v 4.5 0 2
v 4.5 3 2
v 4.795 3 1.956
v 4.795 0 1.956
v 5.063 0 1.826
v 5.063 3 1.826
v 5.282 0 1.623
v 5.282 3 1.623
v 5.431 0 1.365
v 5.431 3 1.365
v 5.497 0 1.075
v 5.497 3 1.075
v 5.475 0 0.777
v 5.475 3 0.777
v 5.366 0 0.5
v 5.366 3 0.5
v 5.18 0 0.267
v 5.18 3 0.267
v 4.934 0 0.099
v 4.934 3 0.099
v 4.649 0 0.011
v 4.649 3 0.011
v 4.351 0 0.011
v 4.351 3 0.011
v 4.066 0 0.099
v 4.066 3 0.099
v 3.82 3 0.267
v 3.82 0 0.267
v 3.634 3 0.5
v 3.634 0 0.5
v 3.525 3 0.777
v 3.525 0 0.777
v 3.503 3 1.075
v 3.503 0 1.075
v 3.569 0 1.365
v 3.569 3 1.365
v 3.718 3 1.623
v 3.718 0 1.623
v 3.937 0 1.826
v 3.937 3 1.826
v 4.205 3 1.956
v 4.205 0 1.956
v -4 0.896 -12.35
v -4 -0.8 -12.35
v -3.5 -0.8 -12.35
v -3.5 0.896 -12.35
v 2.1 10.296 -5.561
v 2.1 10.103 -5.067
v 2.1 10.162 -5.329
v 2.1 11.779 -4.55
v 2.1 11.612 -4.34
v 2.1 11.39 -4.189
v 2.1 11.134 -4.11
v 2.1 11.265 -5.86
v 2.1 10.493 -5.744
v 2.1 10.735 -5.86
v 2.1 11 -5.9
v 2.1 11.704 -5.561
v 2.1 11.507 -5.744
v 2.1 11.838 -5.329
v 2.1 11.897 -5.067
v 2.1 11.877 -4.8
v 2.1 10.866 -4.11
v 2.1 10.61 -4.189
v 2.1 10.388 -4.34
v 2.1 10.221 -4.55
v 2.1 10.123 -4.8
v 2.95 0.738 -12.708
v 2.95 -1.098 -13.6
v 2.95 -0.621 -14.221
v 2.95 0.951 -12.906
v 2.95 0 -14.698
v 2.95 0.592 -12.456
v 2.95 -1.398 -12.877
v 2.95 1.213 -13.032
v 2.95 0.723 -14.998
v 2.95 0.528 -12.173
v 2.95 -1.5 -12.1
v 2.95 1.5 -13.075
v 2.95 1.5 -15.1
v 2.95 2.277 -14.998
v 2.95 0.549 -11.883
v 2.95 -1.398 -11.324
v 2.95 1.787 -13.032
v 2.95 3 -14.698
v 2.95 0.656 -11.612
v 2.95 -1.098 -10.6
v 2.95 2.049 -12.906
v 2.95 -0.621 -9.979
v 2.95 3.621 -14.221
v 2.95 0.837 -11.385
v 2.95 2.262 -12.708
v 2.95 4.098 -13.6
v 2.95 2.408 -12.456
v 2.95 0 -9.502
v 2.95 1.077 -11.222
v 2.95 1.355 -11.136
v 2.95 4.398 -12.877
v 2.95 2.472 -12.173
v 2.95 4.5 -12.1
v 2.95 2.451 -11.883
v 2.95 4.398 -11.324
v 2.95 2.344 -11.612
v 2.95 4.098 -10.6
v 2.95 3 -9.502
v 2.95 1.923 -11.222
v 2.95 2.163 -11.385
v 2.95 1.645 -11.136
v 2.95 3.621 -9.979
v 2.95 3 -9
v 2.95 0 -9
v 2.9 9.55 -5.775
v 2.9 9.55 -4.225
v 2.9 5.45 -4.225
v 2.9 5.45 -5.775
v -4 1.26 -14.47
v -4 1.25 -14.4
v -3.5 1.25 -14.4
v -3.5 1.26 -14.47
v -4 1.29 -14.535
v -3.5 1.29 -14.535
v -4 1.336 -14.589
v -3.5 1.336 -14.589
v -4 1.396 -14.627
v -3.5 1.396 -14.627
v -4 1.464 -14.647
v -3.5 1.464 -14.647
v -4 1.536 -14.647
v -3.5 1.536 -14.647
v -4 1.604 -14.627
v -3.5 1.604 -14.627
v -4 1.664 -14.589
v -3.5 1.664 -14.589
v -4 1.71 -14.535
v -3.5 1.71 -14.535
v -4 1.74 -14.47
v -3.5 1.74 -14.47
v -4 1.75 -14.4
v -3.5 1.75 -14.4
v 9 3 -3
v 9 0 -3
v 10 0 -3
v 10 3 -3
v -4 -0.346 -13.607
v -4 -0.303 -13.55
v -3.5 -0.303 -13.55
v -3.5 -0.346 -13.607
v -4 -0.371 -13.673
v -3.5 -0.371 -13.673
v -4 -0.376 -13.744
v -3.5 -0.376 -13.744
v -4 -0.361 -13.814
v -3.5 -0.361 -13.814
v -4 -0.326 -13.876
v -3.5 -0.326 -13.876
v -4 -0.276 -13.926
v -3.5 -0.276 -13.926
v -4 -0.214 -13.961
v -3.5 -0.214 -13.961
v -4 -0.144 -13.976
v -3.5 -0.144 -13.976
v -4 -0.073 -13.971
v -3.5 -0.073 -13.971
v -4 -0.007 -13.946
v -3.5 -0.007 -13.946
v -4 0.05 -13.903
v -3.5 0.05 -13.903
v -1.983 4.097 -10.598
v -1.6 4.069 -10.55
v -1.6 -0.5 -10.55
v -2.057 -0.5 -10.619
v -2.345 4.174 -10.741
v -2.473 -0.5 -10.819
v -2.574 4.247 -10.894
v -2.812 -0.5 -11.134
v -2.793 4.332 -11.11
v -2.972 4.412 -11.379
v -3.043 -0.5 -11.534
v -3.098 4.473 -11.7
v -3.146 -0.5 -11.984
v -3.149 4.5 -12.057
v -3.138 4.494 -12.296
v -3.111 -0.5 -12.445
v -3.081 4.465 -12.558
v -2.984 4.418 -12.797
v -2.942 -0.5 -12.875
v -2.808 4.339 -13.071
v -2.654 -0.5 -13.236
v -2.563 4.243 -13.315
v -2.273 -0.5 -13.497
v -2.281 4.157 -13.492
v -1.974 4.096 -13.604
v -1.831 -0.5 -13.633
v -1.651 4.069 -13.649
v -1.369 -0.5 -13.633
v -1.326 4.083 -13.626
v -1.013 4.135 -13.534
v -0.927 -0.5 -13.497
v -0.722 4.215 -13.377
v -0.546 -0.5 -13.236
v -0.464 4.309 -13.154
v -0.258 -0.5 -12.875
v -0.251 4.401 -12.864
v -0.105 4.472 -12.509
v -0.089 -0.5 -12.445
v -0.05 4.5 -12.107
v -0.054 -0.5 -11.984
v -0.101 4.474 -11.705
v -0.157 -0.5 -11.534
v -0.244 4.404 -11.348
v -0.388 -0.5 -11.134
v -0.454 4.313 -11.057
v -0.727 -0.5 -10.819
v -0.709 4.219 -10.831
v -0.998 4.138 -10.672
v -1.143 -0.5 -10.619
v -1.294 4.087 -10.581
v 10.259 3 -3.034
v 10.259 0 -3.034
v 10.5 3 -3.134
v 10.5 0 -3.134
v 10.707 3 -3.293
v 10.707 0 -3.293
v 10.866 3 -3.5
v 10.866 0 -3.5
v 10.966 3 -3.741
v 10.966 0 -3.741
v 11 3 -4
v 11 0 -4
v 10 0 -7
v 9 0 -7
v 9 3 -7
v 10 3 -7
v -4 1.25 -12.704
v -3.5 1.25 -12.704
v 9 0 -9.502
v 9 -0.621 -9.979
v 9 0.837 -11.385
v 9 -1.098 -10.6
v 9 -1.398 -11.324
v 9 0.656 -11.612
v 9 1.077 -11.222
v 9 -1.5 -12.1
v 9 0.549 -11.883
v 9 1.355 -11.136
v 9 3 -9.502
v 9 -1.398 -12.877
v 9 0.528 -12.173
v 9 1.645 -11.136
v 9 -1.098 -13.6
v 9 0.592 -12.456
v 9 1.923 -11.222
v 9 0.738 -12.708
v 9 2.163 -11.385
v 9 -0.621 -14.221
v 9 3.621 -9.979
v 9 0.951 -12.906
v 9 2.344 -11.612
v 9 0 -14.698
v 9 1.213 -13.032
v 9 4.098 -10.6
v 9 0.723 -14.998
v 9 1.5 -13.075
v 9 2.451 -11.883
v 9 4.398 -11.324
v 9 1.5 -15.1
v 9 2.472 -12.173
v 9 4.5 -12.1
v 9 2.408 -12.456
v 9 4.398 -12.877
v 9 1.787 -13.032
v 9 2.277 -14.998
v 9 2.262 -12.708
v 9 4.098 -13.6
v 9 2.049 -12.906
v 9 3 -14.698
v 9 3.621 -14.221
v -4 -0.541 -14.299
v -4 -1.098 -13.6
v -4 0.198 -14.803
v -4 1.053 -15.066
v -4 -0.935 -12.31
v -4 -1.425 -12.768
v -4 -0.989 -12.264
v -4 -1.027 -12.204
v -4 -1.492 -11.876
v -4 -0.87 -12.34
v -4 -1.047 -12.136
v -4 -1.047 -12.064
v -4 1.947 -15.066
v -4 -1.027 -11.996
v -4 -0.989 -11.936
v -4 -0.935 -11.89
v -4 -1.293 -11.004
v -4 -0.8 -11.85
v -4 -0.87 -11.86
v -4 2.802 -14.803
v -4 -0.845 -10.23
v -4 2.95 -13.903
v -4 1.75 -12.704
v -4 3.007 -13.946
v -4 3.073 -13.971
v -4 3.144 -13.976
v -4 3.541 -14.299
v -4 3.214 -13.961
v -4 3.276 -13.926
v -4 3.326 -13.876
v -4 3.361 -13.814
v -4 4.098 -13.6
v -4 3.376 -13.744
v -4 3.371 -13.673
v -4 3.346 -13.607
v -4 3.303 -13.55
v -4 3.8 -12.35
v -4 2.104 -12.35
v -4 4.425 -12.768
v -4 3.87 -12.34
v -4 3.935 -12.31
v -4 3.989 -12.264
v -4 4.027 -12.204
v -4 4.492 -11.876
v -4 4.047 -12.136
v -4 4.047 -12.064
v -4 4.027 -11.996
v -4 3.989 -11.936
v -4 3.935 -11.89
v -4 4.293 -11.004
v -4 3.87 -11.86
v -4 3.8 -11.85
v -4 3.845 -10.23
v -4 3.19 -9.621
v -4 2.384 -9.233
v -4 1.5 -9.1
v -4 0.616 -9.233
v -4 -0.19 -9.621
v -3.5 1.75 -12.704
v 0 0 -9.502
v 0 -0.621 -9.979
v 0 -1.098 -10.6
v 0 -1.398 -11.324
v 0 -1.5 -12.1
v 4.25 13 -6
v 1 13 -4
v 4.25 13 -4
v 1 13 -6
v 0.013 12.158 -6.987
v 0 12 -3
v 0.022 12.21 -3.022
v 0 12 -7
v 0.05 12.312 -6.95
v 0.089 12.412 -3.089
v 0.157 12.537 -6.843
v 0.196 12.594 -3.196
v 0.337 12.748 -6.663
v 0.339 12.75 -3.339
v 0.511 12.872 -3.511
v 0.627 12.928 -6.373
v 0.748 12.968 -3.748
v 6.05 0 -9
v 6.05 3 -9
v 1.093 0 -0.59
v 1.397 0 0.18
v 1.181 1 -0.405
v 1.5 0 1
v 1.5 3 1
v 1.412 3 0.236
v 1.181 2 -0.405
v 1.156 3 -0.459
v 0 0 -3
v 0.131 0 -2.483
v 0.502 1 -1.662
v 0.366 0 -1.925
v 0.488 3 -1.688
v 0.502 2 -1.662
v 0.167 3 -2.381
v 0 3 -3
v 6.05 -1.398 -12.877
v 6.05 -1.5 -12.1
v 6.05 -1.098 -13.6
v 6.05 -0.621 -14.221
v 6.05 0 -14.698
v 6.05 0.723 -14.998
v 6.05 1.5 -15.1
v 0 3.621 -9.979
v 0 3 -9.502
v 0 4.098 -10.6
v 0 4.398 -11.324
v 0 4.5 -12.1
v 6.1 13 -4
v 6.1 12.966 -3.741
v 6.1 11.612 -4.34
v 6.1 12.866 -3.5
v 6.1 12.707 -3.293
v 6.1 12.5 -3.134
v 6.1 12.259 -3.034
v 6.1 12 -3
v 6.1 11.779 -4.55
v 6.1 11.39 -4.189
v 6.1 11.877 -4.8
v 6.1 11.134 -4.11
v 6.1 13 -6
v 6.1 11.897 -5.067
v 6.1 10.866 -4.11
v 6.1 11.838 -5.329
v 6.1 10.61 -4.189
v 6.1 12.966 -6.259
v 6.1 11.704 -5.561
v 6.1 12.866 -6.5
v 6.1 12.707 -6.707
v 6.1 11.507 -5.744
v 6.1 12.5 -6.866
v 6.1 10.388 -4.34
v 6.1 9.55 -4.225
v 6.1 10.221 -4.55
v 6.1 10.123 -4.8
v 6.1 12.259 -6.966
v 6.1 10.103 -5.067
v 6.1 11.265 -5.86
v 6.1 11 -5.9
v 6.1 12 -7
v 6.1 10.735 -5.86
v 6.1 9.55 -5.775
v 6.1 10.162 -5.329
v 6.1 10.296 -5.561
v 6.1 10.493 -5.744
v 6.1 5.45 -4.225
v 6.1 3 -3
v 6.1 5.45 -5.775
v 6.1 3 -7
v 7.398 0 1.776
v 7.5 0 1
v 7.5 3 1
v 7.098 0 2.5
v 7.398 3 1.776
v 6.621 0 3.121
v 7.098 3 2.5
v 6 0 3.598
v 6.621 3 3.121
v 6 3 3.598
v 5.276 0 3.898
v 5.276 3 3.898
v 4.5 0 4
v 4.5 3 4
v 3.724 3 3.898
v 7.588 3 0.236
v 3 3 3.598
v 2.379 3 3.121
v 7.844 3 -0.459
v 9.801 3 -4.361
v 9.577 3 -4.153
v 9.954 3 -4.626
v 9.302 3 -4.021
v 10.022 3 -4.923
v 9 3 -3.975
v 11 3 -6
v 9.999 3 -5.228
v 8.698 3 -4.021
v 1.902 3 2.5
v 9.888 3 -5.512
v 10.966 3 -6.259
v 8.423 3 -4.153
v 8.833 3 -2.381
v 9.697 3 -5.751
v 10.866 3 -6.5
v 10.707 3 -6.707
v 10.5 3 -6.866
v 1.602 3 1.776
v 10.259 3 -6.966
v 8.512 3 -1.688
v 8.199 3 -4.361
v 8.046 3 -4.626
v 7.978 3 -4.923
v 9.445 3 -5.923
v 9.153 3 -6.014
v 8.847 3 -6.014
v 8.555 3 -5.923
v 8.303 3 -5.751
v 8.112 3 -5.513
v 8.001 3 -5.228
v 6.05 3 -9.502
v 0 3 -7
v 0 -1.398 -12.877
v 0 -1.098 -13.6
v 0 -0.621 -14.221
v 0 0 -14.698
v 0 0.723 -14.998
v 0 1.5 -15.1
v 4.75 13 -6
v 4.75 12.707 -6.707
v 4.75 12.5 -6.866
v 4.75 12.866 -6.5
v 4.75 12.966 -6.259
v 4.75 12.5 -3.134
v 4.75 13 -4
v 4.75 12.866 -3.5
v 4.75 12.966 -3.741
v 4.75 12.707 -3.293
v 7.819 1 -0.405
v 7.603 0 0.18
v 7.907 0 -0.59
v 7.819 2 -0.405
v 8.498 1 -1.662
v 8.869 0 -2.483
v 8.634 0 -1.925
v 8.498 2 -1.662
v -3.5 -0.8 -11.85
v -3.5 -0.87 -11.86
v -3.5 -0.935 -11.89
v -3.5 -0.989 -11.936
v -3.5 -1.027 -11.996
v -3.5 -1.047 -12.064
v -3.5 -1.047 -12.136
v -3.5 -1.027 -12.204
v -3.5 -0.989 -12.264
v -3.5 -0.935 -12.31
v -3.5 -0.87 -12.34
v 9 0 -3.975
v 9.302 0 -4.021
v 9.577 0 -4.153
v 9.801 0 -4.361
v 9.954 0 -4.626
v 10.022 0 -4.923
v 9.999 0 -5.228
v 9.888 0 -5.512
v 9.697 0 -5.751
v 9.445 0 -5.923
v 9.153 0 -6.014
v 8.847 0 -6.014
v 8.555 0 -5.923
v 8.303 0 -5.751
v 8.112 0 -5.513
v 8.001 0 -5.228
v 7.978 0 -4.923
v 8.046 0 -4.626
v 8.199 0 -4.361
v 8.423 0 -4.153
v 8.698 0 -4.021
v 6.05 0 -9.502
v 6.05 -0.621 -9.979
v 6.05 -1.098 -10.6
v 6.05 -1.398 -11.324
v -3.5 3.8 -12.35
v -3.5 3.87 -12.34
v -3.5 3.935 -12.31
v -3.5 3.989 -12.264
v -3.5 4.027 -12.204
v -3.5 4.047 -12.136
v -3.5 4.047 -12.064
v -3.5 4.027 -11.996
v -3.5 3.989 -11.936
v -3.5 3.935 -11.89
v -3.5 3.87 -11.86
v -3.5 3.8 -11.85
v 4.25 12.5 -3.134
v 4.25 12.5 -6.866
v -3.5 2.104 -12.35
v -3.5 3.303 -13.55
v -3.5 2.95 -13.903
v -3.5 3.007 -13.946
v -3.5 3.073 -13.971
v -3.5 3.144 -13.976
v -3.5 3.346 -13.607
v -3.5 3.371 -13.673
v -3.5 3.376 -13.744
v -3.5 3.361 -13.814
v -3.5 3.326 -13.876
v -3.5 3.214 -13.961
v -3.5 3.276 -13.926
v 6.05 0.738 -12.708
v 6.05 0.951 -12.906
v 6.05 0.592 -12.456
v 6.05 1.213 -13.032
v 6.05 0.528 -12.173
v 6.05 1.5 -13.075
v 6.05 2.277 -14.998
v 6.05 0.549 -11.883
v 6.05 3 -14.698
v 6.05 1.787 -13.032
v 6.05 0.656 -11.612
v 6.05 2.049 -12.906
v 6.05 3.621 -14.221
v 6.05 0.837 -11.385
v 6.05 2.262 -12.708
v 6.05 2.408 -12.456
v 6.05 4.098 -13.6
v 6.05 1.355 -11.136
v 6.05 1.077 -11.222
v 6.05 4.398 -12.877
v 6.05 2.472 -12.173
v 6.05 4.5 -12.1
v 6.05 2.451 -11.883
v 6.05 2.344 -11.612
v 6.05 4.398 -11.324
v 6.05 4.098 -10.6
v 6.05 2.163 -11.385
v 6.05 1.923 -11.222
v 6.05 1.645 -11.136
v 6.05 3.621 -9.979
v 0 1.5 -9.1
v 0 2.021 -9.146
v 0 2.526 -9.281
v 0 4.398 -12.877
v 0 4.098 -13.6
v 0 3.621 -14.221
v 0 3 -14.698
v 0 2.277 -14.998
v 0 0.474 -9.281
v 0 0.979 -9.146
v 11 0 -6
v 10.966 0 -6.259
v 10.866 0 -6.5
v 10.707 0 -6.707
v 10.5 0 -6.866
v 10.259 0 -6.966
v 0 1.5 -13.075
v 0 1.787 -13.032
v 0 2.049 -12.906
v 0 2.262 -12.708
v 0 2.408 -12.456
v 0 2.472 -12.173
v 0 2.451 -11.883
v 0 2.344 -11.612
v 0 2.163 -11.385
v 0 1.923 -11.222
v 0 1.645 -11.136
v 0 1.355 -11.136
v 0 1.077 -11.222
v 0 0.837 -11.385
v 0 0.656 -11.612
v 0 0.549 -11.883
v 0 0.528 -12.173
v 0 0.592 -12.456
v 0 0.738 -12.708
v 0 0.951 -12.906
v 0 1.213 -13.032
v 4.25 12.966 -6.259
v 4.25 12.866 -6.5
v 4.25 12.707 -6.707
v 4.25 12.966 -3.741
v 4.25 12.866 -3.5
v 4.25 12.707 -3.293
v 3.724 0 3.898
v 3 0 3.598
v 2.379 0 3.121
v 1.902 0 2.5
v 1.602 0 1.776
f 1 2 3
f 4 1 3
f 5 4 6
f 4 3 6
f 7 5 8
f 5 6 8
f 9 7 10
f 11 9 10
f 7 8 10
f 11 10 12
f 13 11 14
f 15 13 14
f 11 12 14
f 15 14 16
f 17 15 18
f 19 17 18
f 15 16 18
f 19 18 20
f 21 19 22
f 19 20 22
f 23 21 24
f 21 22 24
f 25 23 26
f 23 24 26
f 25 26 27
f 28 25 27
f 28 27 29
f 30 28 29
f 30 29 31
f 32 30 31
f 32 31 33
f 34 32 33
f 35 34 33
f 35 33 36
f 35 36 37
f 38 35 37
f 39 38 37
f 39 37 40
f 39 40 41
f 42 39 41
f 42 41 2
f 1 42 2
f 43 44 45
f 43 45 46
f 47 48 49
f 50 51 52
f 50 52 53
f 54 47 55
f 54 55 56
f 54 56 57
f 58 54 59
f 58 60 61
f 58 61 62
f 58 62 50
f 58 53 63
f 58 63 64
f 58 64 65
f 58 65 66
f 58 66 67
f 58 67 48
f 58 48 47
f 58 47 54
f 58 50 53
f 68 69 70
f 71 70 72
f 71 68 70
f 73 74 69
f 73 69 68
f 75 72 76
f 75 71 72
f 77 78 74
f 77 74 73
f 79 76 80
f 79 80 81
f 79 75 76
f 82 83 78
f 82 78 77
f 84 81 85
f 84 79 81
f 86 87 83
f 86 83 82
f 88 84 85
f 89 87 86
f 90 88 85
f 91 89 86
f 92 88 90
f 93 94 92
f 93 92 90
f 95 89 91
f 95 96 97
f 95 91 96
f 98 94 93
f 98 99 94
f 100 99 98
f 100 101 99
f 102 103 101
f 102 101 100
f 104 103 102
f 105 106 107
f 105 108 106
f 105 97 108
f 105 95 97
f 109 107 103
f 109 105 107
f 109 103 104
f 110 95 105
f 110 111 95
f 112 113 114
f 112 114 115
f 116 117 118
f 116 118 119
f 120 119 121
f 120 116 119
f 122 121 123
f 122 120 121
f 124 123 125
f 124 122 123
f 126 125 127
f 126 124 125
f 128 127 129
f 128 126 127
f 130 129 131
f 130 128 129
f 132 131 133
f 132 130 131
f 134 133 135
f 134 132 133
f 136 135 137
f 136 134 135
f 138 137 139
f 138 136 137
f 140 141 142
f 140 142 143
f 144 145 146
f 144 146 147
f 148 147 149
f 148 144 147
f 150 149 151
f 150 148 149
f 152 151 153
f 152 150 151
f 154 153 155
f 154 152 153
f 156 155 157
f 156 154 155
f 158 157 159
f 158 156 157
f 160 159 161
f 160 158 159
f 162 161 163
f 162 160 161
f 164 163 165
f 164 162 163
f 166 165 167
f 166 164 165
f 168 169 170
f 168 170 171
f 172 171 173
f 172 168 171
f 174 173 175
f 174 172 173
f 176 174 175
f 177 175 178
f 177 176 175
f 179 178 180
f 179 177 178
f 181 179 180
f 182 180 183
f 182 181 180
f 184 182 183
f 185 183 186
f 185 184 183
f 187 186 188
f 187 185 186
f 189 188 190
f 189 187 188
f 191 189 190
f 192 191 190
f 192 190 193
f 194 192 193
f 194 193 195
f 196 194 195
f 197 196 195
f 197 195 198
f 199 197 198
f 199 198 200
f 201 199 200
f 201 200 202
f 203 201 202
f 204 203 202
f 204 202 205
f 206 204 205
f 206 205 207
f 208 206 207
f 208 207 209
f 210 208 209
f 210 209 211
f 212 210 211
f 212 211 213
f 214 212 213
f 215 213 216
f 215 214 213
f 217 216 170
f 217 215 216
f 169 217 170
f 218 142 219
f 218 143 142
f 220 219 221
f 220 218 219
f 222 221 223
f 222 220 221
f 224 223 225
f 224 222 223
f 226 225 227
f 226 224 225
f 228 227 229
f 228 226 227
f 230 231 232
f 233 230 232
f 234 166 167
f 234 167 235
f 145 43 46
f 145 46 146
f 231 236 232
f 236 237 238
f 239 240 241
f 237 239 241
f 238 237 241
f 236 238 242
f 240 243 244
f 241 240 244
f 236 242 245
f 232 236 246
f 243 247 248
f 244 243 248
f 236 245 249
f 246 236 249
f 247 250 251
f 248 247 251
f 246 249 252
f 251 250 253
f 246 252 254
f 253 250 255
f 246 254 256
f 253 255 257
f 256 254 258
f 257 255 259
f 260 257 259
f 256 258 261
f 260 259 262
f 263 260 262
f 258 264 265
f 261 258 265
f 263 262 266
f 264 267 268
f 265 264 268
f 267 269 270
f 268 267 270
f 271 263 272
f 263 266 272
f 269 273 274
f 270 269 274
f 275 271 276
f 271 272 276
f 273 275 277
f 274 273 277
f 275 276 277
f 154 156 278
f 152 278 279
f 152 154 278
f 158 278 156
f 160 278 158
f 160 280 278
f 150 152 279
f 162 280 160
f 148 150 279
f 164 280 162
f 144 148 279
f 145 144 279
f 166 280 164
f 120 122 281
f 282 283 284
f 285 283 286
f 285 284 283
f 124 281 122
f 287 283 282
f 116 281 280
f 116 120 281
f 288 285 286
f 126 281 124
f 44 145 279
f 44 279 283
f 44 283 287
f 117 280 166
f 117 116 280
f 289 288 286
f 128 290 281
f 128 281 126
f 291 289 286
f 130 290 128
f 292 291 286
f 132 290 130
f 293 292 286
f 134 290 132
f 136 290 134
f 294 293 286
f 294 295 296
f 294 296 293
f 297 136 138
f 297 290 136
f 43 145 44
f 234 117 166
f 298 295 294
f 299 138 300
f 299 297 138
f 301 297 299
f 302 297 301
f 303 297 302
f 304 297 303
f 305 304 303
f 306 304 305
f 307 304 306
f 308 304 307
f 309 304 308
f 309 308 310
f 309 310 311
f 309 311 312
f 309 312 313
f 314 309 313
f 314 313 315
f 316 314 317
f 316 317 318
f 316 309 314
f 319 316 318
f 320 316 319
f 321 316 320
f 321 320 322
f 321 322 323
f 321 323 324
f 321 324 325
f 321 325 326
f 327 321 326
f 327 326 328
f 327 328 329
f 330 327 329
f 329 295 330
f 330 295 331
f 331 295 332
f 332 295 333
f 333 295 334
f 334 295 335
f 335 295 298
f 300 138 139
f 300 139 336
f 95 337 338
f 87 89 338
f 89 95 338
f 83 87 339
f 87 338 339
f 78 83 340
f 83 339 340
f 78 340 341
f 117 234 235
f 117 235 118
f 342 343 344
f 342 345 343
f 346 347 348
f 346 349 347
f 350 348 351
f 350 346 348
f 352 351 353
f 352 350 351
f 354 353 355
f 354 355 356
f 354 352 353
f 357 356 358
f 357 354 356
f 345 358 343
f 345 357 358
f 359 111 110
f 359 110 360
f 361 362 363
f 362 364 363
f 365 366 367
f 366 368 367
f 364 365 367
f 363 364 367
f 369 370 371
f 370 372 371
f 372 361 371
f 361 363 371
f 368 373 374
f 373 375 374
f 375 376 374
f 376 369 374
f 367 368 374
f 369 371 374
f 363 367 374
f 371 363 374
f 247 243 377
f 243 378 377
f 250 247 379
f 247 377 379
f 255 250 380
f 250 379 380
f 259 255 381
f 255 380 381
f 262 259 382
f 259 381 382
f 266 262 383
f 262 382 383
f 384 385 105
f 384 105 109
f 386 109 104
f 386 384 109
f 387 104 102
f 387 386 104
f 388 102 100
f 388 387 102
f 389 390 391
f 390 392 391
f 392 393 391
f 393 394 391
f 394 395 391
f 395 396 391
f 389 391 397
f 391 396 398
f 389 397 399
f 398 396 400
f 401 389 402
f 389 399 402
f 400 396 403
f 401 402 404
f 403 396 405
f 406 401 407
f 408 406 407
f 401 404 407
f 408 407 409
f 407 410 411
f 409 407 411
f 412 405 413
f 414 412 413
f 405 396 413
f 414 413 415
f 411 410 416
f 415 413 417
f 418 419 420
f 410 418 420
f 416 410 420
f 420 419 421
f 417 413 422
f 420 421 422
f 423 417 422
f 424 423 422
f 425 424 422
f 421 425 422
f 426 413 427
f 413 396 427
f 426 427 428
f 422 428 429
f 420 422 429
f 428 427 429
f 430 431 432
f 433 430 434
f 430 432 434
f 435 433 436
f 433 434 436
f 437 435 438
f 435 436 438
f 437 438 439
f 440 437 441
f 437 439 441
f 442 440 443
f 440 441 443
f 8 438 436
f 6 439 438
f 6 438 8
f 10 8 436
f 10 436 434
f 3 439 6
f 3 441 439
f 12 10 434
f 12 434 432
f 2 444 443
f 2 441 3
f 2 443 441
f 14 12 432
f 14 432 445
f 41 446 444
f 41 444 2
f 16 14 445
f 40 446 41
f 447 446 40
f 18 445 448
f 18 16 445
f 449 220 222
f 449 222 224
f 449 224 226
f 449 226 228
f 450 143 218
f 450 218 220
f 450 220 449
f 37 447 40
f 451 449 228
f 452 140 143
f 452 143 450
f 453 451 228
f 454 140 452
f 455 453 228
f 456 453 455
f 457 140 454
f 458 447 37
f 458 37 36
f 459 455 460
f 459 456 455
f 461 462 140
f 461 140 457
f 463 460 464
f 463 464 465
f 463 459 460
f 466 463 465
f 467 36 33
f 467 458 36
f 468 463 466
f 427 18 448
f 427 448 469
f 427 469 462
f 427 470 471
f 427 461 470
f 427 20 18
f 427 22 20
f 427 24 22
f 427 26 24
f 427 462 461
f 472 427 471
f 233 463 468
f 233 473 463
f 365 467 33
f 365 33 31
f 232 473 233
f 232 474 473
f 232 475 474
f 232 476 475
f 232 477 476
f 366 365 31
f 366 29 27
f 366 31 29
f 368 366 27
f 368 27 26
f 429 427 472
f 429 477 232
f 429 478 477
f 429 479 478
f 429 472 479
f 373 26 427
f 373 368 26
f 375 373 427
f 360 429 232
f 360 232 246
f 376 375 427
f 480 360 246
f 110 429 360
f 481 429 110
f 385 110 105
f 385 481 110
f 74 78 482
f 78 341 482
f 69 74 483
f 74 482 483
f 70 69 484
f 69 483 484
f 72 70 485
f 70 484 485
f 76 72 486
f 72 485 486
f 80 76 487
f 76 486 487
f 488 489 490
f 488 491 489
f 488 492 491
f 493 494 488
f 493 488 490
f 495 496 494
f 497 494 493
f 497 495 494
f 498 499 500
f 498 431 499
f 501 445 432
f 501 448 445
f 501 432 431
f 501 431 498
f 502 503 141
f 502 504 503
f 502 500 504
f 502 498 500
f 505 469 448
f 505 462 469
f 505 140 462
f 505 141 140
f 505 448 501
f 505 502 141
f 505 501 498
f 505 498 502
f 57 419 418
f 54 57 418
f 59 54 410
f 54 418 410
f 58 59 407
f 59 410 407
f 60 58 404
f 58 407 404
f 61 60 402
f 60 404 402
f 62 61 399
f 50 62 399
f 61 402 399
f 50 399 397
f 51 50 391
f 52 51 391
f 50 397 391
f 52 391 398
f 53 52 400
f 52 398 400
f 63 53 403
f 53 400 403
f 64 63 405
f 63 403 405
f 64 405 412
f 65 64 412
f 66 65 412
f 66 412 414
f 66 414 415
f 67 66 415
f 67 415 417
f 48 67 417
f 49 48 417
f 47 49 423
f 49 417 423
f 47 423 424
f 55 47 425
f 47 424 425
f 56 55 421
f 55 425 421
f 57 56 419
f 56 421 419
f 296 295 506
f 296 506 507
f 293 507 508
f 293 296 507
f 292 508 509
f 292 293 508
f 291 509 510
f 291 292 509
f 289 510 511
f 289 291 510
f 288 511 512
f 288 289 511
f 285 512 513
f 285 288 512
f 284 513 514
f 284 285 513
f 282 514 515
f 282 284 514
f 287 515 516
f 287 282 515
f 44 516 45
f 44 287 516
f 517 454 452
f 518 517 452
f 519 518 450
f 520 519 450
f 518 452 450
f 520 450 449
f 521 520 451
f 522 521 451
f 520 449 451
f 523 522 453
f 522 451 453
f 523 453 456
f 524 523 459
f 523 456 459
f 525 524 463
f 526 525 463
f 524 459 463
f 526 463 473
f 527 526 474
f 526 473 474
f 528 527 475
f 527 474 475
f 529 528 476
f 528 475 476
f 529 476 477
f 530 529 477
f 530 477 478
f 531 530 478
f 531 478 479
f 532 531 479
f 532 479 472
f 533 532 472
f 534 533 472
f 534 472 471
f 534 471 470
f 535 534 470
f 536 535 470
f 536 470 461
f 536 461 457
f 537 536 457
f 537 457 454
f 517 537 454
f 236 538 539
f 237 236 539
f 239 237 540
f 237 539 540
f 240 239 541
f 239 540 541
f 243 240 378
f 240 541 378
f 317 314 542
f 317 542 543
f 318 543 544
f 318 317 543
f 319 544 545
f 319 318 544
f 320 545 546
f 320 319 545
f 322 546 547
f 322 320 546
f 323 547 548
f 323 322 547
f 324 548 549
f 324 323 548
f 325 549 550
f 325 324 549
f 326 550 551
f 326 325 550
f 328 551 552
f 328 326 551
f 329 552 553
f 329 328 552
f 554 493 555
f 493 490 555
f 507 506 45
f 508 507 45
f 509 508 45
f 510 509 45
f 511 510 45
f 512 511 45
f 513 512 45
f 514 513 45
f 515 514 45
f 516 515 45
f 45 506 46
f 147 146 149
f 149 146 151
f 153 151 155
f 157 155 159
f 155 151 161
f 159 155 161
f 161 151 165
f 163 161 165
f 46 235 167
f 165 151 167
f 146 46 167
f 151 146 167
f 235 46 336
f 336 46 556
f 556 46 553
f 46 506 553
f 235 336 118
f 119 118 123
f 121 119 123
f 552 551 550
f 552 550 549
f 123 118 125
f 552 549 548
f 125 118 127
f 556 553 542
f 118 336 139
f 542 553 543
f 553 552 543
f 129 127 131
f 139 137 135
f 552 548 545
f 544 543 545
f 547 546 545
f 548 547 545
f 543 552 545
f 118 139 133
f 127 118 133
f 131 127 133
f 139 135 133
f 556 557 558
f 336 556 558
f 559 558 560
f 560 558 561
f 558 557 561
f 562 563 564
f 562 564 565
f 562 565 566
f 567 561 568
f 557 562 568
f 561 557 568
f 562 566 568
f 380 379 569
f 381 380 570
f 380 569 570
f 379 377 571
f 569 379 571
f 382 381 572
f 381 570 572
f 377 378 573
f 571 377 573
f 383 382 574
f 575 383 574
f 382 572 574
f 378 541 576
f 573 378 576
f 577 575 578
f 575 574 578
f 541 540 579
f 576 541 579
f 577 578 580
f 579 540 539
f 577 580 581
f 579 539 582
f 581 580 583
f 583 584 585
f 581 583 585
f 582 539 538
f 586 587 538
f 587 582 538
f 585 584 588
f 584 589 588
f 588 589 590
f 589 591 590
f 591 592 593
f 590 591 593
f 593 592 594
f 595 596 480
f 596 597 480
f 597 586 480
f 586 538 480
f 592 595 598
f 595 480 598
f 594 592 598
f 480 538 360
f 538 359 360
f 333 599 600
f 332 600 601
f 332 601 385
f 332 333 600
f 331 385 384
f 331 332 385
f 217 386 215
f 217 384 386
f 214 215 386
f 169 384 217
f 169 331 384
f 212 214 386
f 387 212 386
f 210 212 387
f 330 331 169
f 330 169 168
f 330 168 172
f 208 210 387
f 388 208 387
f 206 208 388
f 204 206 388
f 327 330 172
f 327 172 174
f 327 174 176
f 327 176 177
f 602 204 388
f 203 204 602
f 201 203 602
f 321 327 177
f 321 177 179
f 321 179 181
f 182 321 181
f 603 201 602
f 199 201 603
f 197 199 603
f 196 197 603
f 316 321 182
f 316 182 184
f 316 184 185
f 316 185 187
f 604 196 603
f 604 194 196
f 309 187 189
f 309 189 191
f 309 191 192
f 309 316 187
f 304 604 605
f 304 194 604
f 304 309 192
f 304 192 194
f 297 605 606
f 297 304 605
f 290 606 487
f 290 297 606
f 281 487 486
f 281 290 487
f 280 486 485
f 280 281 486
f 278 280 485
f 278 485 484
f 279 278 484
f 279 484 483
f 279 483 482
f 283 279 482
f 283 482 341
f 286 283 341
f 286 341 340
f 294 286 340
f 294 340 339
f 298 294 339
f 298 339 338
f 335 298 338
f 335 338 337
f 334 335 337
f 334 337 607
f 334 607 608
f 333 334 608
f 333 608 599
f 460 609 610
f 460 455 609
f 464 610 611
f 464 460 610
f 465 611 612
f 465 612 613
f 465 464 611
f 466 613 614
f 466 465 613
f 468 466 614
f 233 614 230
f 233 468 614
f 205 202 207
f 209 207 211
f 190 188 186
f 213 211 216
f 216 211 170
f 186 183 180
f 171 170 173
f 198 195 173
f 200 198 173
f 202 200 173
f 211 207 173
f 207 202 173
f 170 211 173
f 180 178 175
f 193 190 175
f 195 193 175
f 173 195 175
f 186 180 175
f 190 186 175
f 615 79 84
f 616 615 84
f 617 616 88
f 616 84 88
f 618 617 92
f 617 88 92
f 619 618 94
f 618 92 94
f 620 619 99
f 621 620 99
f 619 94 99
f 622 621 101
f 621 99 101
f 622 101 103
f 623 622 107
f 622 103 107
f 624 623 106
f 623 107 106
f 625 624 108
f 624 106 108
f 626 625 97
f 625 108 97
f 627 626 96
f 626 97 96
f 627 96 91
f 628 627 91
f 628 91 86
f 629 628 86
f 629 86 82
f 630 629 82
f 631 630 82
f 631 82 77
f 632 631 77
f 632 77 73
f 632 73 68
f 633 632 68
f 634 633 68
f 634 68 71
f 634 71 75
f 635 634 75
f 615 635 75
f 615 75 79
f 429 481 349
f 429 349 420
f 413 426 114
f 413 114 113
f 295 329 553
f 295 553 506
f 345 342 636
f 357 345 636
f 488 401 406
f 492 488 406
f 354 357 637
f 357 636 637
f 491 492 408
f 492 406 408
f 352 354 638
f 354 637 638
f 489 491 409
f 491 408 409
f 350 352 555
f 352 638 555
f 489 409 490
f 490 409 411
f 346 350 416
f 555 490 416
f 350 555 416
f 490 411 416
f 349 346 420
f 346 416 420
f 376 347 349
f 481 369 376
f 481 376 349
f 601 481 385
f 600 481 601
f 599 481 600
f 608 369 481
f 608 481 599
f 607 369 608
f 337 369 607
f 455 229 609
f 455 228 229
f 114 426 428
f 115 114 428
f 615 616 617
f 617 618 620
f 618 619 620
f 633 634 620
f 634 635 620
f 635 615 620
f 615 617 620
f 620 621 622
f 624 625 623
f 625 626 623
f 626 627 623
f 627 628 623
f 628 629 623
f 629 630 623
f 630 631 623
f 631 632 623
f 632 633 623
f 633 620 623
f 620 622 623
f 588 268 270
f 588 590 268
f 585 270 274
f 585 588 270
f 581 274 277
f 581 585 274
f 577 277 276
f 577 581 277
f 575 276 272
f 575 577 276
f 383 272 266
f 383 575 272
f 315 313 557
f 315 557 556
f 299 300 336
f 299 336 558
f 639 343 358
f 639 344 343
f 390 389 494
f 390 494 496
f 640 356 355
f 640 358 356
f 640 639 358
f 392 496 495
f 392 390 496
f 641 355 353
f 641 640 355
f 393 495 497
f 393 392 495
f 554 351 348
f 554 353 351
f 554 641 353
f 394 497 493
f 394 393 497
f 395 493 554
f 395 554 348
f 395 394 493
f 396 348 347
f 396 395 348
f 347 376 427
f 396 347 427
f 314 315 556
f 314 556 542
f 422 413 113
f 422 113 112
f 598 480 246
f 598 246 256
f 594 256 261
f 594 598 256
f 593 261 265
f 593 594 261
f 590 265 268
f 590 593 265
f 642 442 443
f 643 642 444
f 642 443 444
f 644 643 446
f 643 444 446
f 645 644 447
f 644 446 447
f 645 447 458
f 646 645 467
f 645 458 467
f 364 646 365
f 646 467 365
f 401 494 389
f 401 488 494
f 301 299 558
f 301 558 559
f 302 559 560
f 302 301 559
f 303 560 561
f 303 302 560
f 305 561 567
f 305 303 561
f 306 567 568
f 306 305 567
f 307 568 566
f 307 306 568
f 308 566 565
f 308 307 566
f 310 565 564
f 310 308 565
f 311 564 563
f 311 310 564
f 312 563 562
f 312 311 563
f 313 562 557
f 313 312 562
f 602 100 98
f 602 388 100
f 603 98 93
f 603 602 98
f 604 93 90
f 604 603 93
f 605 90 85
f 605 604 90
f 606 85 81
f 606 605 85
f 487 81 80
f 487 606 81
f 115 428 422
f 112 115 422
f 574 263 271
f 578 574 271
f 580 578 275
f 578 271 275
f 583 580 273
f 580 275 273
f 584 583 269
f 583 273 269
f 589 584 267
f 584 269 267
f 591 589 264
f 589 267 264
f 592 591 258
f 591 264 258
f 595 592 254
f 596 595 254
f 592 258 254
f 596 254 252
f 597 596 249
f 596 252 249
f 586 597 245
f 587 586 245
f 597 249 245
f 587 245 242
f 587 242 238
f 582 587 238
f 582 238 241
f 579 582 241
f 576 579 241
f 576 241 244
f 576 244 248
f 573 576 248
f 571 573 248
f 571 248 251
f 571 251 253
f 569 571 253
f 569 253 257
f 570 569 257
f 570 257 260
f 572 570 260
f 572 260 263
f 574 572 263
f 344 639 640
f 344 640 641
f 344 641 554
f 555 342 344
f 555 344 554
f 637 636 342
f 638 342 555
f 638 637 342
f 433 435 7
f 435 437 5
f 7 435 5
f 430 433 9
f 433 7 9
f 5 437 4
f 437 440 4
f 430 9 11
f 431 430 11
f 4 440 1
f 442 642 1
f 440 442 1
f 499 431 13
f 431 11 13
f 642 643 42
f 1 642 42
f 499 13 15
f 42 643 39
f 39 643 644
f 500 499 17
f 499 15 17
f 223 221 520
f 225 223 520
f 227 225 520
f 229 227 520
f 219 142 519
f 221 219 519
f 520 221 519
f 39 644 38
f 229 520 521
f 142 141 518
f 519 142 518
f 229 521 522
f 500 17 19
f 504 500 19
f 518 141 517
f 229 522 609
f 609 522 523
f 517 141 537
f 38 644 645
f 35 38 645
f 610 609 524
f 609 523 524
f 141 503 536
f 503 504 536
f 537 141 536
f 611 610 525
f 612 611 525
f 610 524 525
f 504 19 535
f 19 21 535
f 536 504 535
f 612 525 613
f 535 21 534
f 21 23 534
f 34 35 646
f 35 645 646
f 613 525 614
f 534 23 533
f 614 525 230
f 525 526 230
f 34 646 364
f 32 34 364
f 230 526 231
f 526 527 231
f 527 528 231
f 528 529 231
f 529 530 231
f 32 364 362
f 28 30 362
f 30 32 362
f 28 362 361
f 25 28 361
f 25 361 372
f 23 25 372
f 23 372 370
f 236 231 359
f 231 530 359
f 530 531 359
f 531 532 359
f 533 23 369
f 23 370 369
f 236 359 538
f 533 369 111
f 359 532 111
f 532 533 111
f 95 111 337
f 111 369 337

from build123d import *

# Parameters (mm, degrees)
SKETCH1_W           = 9
SKETCH1_H           = 9
BOSS_EXTRUDE1_DEPTH = 3
SKETCH2_W           = 2.95
SKETCH2_H           = 6
BOSS_EXTRUDE2_DEPTH = 6.1
FILLET1_R           = 3
SKETCH3_R           = 0.975
CUT_EXTRUDE1_DEPTH  = 11.1
CUT_EXTRUDE3_DEPTH  = 21.1
BOSS_EXTRUDE3_START = 4
SKETCH5_R           = 3
BOSS_EXTRUDE3_DEPTH = 4
SKETCH8_R           = 1.55
CUT_EXTRUDE4_DEPTH  = 5
CUT_EXTRUDE5_DEPTH  = 0.5
SKETCH10_W          = 9
SKETCH10_H          = 3
BOSS_EXTRUDE4_DEPTH = 4
SKETCH11_R          = 1
CUT_EXTRUDE6_DEPTH  = 4
CUT_EXTRUDE7_DEPTH  = 4
SKETCH13_W          = 6.1
SKETCH13_H          = 4
BOSS_EXTRUDE7_DEPTH = 7.5
SKETCH16_W          = 1.55
SKETCH16_H          = 4.1
CUT_EXTRUDE9_DEPTH  = 3.2
SKETCH17_W          = 4
SKETCH17_H          = 3
BOSS_EXTRUDE8_DEPTH = 2
SKETCH19_R          = 1.025
CUT_EXTRUDE10_DEPTH = 4
FILLET2_R           = 1
SKETCH21_W          = 6.1
SKETCH21_H          = 4
BOSS_EXTRUDE9_DEPTH = 2.5
SKETCH23_R          = 0.9
CUT_EXTRUDE11_DEPTH = 4
FILLET3_R           = 1
CUT_EXTRUDE12_DEPTH = 0.5


with BuildPart() as part:
    # Sketch1 → Boss-Extrude1 (new body)
    with BuildSketch(Plane(origin=(0, 0, 0), x_dir=(1, 0, 0), z_dir=(0, 1, 0))):
        with Locations((4.5, 4.5)):
            Rectangle(SKETCH1_W, SKETCH1_H)
    extrude(amount=BOSS_EXTRUDE1_DEPTH)

    # Sketch2 → Boss-Extrude2 (add)
    with BuildSketch(Plane(origin=(0, 0, -9), x_dir=(-1, 0, 0), z_dir=(0, 0, -1))):
        with Locations((-7.525, 1.5)):
            Rectangle(SKETCH2_W, SKETCH2_H)
        with Locations((-1.475, 1.5)):
            Rectangle(SKETCH2_W, SKETCH2_H)
    extrude(amount=BOSS_EXTRUDE2_DEPTH)

    # Fillet1
    fillet1_edges = [part.edges().sort_by_distance(p)[0] for p in [
        (1.475, 4.5, -15.1),
        (1.475, -1.5, -15.1),
        (7.525, -1.5, -15.1),
        (7.525, 4.5, -15.1),
    ]]
    fillet(fillet1_edges, radius=FILLET1_R - 0.0001)  # a hair under: the kernel refuses the full size

    # Sketch3 → Cut-Extrude1 (cut)
    with BuildSketch(Plane(origin=(9, 0, 0), x_dir=(0, 0, -1), z_dir=(1, 0, 0))):
        with Locations((12.1, 1.5)):
            Circle(SKETCH3_R)
    extrude(amount=-CUT_EXTRUDE1_DEPTH, mode=Mode.SUBTRACT)

    # Sketch6 → Cut-Extrude3 (cut)
    with BuildSketch(Plane.ZY):
        with BuildLine():
            Line((-12.1, 4.5), (-9, 4.5))
            Line((-9, 4.5), (-9, 3))
            Line((-9, 3), (-9.501923789, 3))
            ThreePointArc((-9.501923789, 3), (-10.6, 4.098076211), (-12.1, 4.5))
        make_face()
        with BuildLine():
            Line((-12.1, -1.5), (-9, -1.5))
            Line((-9, -1.5), (-9, 0))
            Line((-9, 0), (-9.501923789, 0))
            ThreePointArc((-9.501923789, 0), (-10.6, -1.098076211), (-12.1, -1.5))
        make_face()
    extrude(amount=-CUT_EXTRUDE3_DEPTH, mode=Mode.SUBTRACT)

    # Sketch5 → Boss-Extrude3 (add)
    with BuildSketch(Plane.ZY.offset(BOSS_EXTRUDE3_START)):
        with Locations((-12.1, 1.5)):
            Circle(SKETCH5_R)
    extrude(amount=-BOSS_EXTRUDE3_DEPTH)

    # Sketch8 → Cut-Extrude4 (cut)
    with BuildSketch(Plane(origin=(0, 4.5, 0), x_dir=(-1, 0, 0), z_dir=(0, -1, 0))):
        with Locations(Location((1.6, 12.1, 0), (0, 0, 270))):
            Circle(SKETCH8_R)
    extrude(amount=CUT_EXTRUDE4_DEPTH, mode=Mode.SUBTRACT)

    # Sketch9 → Cut-Extrude5 (cut)
    with BuildSketch(Plane.ZY.offset(4)):
        with BuildLine():
            Line((-11.85, 1.5), (-11.85, -0.8))
            ThreePointArc((-11.85, -0.8), (-12.1, -1.05), (-12.35, -0.8))
            Line((-12.35, -0.8), (-12.35, 0.896446609))
            Line((-12.35, 0.896446609), (-13.549568901, -0.303122292))
            ThreePointArc((-13.549568901, -0.303122292), (-13.903122292, -0.303122292), (-13.903122292, 0.050431099))
            Line((-13.903122292, 0.050431099), (-12.703553391, 1.25))
            Line((-12.703553391, 1.25), (-14.4, 1.25))
            ThreePointArc((-14.4, 1.25), (-14.65, 1.5), (-14.4, 1.75))
            Line((-14.4, 1.75), (-12.703553391, 1.75))
            Line((-12.703553391, 1.75), (-13.903122292, 2.949568901))
            ThreePointArc((-13.903122292, 2.949568901), (-13.903122292, 3.303122292), (-13.549568901, 3.303122292))
            Line((-13.549568901, 3.303122292), (-12.35, 2.103553391))
            Line((-12.35, 2.103553391), (-12.35, 3.8))
            ThreePointArc((-12.35, 3.8), (-12.1, 4.05), (-11.85, 3.8))
            Line((-11.85, 3.8), (-11.85, 1.5))
        make_face()
    extrude(amount=-CUT_EXTRUDE5_DEPTH, mode=Mode.SUBTRACT)

    # Sketch10 → Boss-Extrude4 (add)
    with BuildSketch(Plane.XY):
        with Locations((4.5, 1.5)):
            Rectangle(SKETCH10_W, SKETCH10_H)
    extrude(amount=BOSS_EXTRUDE4_DEPTH)

    # Sketch11 → Cut-Extrude6 (cut)
    with BuildSketch(Plane(origin=(0, 3, 0), x_dir=(1, 0, 0), z_dir=(0, 1, 0))):
        with Locations(Location((4.5, -1, 0), (0, 0, 270))):
            Circle(SKETCH11_R)
    extrude(amount=-CUT_EXTRUDE6_DEPTH, mode=Mode.SUBTRACT)

    # Sketch12 → Cut-Extrude7 (cut)
    with BuildSketch(Plane(origin=(0, 3, 0), x_dir=(1, 0, 0), z_dir=(0, 1, 0))):
        with BuildLine():
            add(Edge.make_bspline(
                [(1.5, -1), (1.53988428, 0.555027292), (0.235256098, 1.545486909), (0, 3)],
                knots=[0, 0, 0, 0, 1, 1, 1, 1], degree=3))
            Line((0, 3), (0, -4))
            Line((0, -4), (4.5, -4))
            ThreePointArc((4.5, -4), (2.378679656, -3.121320344), (1.5, -1))
        make_face()
        with BuildLine():
            ThreePointArc((7.5, -1), (6.621320344, -3.121320344), (4.5, -4))
            Line((4.5, -4), (9, -4))
            Line((9, -4), (9, 3))
            add(Edge.make_bspline(
                [(7.5, -1), (7.46011572, 0.555027292), (8.764743902, 1.545486909), (9, 3)],
                knots=[0, 0, 0, 0, 1, 1, 1, 1], degree=3))
        make_face()
    extrude(amount=-CUT_EXTRUDE7_DEPTH, mode=Mode.SUBTRACT)

    # Sketch13 → Boss-Extrude7 (add)
    with BuildSketch(Plane(origin=(0, 3, 0), x_dir=(1, 0, 0), z_dir=(0, 1, 0))):
        with Locations((3.05, 5)):
            Rectangle(SKETCH13_W, SKETCH13_H)
    extrude(amount=BOSS_EXTRUDE7_DEPTH)

    # Sketch16 → Cut-Extrude9 (cut)
    with BuildSketch(Plane(origin=(6.1, 0, 0), x_dir=(0, 0, -1), z_dir=(1, 0, 0))):
        with Locations((5, 7.5)):
            Rectangle(SKETCH16_W, SKETCH16_H)
    extrude(amount=-CUT_EXTRUDE9_DEPTH, mode=Mode.SUBTRACT)

    # Sketch17 → Boss-Extrude8 (add)
    with BuildSketch(Plane(origin=(9, 0, 0), x_dir=(0, 0, -1), z_dir=(1, 0, 0))):
        with Locations((5, 1.5)):
            Rectangle(SKETCH17_W, SKETCH17_H)
    extrude(amount=BOSS_EXTRUDE8_DEPTH)

    # Sketch19 → Cut-Extrude10 (cut)
    with BuildSketch(Plane(origin=(0, 3, 0), x_dir=(1, 0, 0), z_dir=(0, 1, 0))):
        with Locations(Location((9, 5, 0), (0, 0, 270))):
            Circle(SKETCH19_R)
    extrude(amount=-CUT_EXTRUDE10_DEPTH, mode=Mode.SUBTRACT)

    # Fillet2
    fillet2_edges = [part.edges().sort_by_distance(p)[0] for p in [
        (11, 1.5, -3),
        (11, 1.5, -7),
    ]]
    fillet(fillet2_edges, radius=FILLET2_R)

    # Sketch21 → Boss-Extrude9 (add)
    with BuildSketch(Plane(origin=(0, 10.5, 0), x_dir=(1, 0, 0), z_dir=(0, 1, 0))):
        with Locations((3.05, 5)):
            Rectangle(SKETCH21_W, SKETCH21_H)
    extrude(amount=BOSS_EXTRUDE9_DEPTH)

    # Sketch23 → Cut-Extrude11 (cut)
    with BuildSketch(Plane(origin=(6.1, 0, 0), x_dir=(0, 0, -1), z_dir=(1, 0, 0))):
        with Locations((5, 11)):
            Circle(SKETCH23_R)
    extrude(amount=-CUT_EXTRUDE11_DEPTH, mode=Mode.SUBTRACT)

    # Fillet3
    fillet3_edges = [part.edges().sort_by_distance(p)[0] for p in [
        (3.05, 13, -7),
        (0, 13, -5),
        (3.05, 13, -3),
    ]]
    fillet(fillet3_edges, radius=FILLET3_R)

    # Sketch24 → Cut-Extrude12 (cut)
    with BuildSketch(Plane(origin=(0, 13, 0), x_dir=(1, 0, 0), z_dir=(0, 1, 0))):
        with BuildLine():
            Line((4.25, 3), (4.25, 7))
            ThreePointArc((4.25, 7), (4.5, 7.25), (4.75, 7))
            Line((4.75, 7), (4.75, 3))
            ThreePointArc((4.75, 3), (4.5, 2.75), (4.25, 3))
        make_face()
    extrude(amount=-CUT_EXTRUDE12_DEPTH, mode=Mode.SUBTRACT)


solid = part.part
